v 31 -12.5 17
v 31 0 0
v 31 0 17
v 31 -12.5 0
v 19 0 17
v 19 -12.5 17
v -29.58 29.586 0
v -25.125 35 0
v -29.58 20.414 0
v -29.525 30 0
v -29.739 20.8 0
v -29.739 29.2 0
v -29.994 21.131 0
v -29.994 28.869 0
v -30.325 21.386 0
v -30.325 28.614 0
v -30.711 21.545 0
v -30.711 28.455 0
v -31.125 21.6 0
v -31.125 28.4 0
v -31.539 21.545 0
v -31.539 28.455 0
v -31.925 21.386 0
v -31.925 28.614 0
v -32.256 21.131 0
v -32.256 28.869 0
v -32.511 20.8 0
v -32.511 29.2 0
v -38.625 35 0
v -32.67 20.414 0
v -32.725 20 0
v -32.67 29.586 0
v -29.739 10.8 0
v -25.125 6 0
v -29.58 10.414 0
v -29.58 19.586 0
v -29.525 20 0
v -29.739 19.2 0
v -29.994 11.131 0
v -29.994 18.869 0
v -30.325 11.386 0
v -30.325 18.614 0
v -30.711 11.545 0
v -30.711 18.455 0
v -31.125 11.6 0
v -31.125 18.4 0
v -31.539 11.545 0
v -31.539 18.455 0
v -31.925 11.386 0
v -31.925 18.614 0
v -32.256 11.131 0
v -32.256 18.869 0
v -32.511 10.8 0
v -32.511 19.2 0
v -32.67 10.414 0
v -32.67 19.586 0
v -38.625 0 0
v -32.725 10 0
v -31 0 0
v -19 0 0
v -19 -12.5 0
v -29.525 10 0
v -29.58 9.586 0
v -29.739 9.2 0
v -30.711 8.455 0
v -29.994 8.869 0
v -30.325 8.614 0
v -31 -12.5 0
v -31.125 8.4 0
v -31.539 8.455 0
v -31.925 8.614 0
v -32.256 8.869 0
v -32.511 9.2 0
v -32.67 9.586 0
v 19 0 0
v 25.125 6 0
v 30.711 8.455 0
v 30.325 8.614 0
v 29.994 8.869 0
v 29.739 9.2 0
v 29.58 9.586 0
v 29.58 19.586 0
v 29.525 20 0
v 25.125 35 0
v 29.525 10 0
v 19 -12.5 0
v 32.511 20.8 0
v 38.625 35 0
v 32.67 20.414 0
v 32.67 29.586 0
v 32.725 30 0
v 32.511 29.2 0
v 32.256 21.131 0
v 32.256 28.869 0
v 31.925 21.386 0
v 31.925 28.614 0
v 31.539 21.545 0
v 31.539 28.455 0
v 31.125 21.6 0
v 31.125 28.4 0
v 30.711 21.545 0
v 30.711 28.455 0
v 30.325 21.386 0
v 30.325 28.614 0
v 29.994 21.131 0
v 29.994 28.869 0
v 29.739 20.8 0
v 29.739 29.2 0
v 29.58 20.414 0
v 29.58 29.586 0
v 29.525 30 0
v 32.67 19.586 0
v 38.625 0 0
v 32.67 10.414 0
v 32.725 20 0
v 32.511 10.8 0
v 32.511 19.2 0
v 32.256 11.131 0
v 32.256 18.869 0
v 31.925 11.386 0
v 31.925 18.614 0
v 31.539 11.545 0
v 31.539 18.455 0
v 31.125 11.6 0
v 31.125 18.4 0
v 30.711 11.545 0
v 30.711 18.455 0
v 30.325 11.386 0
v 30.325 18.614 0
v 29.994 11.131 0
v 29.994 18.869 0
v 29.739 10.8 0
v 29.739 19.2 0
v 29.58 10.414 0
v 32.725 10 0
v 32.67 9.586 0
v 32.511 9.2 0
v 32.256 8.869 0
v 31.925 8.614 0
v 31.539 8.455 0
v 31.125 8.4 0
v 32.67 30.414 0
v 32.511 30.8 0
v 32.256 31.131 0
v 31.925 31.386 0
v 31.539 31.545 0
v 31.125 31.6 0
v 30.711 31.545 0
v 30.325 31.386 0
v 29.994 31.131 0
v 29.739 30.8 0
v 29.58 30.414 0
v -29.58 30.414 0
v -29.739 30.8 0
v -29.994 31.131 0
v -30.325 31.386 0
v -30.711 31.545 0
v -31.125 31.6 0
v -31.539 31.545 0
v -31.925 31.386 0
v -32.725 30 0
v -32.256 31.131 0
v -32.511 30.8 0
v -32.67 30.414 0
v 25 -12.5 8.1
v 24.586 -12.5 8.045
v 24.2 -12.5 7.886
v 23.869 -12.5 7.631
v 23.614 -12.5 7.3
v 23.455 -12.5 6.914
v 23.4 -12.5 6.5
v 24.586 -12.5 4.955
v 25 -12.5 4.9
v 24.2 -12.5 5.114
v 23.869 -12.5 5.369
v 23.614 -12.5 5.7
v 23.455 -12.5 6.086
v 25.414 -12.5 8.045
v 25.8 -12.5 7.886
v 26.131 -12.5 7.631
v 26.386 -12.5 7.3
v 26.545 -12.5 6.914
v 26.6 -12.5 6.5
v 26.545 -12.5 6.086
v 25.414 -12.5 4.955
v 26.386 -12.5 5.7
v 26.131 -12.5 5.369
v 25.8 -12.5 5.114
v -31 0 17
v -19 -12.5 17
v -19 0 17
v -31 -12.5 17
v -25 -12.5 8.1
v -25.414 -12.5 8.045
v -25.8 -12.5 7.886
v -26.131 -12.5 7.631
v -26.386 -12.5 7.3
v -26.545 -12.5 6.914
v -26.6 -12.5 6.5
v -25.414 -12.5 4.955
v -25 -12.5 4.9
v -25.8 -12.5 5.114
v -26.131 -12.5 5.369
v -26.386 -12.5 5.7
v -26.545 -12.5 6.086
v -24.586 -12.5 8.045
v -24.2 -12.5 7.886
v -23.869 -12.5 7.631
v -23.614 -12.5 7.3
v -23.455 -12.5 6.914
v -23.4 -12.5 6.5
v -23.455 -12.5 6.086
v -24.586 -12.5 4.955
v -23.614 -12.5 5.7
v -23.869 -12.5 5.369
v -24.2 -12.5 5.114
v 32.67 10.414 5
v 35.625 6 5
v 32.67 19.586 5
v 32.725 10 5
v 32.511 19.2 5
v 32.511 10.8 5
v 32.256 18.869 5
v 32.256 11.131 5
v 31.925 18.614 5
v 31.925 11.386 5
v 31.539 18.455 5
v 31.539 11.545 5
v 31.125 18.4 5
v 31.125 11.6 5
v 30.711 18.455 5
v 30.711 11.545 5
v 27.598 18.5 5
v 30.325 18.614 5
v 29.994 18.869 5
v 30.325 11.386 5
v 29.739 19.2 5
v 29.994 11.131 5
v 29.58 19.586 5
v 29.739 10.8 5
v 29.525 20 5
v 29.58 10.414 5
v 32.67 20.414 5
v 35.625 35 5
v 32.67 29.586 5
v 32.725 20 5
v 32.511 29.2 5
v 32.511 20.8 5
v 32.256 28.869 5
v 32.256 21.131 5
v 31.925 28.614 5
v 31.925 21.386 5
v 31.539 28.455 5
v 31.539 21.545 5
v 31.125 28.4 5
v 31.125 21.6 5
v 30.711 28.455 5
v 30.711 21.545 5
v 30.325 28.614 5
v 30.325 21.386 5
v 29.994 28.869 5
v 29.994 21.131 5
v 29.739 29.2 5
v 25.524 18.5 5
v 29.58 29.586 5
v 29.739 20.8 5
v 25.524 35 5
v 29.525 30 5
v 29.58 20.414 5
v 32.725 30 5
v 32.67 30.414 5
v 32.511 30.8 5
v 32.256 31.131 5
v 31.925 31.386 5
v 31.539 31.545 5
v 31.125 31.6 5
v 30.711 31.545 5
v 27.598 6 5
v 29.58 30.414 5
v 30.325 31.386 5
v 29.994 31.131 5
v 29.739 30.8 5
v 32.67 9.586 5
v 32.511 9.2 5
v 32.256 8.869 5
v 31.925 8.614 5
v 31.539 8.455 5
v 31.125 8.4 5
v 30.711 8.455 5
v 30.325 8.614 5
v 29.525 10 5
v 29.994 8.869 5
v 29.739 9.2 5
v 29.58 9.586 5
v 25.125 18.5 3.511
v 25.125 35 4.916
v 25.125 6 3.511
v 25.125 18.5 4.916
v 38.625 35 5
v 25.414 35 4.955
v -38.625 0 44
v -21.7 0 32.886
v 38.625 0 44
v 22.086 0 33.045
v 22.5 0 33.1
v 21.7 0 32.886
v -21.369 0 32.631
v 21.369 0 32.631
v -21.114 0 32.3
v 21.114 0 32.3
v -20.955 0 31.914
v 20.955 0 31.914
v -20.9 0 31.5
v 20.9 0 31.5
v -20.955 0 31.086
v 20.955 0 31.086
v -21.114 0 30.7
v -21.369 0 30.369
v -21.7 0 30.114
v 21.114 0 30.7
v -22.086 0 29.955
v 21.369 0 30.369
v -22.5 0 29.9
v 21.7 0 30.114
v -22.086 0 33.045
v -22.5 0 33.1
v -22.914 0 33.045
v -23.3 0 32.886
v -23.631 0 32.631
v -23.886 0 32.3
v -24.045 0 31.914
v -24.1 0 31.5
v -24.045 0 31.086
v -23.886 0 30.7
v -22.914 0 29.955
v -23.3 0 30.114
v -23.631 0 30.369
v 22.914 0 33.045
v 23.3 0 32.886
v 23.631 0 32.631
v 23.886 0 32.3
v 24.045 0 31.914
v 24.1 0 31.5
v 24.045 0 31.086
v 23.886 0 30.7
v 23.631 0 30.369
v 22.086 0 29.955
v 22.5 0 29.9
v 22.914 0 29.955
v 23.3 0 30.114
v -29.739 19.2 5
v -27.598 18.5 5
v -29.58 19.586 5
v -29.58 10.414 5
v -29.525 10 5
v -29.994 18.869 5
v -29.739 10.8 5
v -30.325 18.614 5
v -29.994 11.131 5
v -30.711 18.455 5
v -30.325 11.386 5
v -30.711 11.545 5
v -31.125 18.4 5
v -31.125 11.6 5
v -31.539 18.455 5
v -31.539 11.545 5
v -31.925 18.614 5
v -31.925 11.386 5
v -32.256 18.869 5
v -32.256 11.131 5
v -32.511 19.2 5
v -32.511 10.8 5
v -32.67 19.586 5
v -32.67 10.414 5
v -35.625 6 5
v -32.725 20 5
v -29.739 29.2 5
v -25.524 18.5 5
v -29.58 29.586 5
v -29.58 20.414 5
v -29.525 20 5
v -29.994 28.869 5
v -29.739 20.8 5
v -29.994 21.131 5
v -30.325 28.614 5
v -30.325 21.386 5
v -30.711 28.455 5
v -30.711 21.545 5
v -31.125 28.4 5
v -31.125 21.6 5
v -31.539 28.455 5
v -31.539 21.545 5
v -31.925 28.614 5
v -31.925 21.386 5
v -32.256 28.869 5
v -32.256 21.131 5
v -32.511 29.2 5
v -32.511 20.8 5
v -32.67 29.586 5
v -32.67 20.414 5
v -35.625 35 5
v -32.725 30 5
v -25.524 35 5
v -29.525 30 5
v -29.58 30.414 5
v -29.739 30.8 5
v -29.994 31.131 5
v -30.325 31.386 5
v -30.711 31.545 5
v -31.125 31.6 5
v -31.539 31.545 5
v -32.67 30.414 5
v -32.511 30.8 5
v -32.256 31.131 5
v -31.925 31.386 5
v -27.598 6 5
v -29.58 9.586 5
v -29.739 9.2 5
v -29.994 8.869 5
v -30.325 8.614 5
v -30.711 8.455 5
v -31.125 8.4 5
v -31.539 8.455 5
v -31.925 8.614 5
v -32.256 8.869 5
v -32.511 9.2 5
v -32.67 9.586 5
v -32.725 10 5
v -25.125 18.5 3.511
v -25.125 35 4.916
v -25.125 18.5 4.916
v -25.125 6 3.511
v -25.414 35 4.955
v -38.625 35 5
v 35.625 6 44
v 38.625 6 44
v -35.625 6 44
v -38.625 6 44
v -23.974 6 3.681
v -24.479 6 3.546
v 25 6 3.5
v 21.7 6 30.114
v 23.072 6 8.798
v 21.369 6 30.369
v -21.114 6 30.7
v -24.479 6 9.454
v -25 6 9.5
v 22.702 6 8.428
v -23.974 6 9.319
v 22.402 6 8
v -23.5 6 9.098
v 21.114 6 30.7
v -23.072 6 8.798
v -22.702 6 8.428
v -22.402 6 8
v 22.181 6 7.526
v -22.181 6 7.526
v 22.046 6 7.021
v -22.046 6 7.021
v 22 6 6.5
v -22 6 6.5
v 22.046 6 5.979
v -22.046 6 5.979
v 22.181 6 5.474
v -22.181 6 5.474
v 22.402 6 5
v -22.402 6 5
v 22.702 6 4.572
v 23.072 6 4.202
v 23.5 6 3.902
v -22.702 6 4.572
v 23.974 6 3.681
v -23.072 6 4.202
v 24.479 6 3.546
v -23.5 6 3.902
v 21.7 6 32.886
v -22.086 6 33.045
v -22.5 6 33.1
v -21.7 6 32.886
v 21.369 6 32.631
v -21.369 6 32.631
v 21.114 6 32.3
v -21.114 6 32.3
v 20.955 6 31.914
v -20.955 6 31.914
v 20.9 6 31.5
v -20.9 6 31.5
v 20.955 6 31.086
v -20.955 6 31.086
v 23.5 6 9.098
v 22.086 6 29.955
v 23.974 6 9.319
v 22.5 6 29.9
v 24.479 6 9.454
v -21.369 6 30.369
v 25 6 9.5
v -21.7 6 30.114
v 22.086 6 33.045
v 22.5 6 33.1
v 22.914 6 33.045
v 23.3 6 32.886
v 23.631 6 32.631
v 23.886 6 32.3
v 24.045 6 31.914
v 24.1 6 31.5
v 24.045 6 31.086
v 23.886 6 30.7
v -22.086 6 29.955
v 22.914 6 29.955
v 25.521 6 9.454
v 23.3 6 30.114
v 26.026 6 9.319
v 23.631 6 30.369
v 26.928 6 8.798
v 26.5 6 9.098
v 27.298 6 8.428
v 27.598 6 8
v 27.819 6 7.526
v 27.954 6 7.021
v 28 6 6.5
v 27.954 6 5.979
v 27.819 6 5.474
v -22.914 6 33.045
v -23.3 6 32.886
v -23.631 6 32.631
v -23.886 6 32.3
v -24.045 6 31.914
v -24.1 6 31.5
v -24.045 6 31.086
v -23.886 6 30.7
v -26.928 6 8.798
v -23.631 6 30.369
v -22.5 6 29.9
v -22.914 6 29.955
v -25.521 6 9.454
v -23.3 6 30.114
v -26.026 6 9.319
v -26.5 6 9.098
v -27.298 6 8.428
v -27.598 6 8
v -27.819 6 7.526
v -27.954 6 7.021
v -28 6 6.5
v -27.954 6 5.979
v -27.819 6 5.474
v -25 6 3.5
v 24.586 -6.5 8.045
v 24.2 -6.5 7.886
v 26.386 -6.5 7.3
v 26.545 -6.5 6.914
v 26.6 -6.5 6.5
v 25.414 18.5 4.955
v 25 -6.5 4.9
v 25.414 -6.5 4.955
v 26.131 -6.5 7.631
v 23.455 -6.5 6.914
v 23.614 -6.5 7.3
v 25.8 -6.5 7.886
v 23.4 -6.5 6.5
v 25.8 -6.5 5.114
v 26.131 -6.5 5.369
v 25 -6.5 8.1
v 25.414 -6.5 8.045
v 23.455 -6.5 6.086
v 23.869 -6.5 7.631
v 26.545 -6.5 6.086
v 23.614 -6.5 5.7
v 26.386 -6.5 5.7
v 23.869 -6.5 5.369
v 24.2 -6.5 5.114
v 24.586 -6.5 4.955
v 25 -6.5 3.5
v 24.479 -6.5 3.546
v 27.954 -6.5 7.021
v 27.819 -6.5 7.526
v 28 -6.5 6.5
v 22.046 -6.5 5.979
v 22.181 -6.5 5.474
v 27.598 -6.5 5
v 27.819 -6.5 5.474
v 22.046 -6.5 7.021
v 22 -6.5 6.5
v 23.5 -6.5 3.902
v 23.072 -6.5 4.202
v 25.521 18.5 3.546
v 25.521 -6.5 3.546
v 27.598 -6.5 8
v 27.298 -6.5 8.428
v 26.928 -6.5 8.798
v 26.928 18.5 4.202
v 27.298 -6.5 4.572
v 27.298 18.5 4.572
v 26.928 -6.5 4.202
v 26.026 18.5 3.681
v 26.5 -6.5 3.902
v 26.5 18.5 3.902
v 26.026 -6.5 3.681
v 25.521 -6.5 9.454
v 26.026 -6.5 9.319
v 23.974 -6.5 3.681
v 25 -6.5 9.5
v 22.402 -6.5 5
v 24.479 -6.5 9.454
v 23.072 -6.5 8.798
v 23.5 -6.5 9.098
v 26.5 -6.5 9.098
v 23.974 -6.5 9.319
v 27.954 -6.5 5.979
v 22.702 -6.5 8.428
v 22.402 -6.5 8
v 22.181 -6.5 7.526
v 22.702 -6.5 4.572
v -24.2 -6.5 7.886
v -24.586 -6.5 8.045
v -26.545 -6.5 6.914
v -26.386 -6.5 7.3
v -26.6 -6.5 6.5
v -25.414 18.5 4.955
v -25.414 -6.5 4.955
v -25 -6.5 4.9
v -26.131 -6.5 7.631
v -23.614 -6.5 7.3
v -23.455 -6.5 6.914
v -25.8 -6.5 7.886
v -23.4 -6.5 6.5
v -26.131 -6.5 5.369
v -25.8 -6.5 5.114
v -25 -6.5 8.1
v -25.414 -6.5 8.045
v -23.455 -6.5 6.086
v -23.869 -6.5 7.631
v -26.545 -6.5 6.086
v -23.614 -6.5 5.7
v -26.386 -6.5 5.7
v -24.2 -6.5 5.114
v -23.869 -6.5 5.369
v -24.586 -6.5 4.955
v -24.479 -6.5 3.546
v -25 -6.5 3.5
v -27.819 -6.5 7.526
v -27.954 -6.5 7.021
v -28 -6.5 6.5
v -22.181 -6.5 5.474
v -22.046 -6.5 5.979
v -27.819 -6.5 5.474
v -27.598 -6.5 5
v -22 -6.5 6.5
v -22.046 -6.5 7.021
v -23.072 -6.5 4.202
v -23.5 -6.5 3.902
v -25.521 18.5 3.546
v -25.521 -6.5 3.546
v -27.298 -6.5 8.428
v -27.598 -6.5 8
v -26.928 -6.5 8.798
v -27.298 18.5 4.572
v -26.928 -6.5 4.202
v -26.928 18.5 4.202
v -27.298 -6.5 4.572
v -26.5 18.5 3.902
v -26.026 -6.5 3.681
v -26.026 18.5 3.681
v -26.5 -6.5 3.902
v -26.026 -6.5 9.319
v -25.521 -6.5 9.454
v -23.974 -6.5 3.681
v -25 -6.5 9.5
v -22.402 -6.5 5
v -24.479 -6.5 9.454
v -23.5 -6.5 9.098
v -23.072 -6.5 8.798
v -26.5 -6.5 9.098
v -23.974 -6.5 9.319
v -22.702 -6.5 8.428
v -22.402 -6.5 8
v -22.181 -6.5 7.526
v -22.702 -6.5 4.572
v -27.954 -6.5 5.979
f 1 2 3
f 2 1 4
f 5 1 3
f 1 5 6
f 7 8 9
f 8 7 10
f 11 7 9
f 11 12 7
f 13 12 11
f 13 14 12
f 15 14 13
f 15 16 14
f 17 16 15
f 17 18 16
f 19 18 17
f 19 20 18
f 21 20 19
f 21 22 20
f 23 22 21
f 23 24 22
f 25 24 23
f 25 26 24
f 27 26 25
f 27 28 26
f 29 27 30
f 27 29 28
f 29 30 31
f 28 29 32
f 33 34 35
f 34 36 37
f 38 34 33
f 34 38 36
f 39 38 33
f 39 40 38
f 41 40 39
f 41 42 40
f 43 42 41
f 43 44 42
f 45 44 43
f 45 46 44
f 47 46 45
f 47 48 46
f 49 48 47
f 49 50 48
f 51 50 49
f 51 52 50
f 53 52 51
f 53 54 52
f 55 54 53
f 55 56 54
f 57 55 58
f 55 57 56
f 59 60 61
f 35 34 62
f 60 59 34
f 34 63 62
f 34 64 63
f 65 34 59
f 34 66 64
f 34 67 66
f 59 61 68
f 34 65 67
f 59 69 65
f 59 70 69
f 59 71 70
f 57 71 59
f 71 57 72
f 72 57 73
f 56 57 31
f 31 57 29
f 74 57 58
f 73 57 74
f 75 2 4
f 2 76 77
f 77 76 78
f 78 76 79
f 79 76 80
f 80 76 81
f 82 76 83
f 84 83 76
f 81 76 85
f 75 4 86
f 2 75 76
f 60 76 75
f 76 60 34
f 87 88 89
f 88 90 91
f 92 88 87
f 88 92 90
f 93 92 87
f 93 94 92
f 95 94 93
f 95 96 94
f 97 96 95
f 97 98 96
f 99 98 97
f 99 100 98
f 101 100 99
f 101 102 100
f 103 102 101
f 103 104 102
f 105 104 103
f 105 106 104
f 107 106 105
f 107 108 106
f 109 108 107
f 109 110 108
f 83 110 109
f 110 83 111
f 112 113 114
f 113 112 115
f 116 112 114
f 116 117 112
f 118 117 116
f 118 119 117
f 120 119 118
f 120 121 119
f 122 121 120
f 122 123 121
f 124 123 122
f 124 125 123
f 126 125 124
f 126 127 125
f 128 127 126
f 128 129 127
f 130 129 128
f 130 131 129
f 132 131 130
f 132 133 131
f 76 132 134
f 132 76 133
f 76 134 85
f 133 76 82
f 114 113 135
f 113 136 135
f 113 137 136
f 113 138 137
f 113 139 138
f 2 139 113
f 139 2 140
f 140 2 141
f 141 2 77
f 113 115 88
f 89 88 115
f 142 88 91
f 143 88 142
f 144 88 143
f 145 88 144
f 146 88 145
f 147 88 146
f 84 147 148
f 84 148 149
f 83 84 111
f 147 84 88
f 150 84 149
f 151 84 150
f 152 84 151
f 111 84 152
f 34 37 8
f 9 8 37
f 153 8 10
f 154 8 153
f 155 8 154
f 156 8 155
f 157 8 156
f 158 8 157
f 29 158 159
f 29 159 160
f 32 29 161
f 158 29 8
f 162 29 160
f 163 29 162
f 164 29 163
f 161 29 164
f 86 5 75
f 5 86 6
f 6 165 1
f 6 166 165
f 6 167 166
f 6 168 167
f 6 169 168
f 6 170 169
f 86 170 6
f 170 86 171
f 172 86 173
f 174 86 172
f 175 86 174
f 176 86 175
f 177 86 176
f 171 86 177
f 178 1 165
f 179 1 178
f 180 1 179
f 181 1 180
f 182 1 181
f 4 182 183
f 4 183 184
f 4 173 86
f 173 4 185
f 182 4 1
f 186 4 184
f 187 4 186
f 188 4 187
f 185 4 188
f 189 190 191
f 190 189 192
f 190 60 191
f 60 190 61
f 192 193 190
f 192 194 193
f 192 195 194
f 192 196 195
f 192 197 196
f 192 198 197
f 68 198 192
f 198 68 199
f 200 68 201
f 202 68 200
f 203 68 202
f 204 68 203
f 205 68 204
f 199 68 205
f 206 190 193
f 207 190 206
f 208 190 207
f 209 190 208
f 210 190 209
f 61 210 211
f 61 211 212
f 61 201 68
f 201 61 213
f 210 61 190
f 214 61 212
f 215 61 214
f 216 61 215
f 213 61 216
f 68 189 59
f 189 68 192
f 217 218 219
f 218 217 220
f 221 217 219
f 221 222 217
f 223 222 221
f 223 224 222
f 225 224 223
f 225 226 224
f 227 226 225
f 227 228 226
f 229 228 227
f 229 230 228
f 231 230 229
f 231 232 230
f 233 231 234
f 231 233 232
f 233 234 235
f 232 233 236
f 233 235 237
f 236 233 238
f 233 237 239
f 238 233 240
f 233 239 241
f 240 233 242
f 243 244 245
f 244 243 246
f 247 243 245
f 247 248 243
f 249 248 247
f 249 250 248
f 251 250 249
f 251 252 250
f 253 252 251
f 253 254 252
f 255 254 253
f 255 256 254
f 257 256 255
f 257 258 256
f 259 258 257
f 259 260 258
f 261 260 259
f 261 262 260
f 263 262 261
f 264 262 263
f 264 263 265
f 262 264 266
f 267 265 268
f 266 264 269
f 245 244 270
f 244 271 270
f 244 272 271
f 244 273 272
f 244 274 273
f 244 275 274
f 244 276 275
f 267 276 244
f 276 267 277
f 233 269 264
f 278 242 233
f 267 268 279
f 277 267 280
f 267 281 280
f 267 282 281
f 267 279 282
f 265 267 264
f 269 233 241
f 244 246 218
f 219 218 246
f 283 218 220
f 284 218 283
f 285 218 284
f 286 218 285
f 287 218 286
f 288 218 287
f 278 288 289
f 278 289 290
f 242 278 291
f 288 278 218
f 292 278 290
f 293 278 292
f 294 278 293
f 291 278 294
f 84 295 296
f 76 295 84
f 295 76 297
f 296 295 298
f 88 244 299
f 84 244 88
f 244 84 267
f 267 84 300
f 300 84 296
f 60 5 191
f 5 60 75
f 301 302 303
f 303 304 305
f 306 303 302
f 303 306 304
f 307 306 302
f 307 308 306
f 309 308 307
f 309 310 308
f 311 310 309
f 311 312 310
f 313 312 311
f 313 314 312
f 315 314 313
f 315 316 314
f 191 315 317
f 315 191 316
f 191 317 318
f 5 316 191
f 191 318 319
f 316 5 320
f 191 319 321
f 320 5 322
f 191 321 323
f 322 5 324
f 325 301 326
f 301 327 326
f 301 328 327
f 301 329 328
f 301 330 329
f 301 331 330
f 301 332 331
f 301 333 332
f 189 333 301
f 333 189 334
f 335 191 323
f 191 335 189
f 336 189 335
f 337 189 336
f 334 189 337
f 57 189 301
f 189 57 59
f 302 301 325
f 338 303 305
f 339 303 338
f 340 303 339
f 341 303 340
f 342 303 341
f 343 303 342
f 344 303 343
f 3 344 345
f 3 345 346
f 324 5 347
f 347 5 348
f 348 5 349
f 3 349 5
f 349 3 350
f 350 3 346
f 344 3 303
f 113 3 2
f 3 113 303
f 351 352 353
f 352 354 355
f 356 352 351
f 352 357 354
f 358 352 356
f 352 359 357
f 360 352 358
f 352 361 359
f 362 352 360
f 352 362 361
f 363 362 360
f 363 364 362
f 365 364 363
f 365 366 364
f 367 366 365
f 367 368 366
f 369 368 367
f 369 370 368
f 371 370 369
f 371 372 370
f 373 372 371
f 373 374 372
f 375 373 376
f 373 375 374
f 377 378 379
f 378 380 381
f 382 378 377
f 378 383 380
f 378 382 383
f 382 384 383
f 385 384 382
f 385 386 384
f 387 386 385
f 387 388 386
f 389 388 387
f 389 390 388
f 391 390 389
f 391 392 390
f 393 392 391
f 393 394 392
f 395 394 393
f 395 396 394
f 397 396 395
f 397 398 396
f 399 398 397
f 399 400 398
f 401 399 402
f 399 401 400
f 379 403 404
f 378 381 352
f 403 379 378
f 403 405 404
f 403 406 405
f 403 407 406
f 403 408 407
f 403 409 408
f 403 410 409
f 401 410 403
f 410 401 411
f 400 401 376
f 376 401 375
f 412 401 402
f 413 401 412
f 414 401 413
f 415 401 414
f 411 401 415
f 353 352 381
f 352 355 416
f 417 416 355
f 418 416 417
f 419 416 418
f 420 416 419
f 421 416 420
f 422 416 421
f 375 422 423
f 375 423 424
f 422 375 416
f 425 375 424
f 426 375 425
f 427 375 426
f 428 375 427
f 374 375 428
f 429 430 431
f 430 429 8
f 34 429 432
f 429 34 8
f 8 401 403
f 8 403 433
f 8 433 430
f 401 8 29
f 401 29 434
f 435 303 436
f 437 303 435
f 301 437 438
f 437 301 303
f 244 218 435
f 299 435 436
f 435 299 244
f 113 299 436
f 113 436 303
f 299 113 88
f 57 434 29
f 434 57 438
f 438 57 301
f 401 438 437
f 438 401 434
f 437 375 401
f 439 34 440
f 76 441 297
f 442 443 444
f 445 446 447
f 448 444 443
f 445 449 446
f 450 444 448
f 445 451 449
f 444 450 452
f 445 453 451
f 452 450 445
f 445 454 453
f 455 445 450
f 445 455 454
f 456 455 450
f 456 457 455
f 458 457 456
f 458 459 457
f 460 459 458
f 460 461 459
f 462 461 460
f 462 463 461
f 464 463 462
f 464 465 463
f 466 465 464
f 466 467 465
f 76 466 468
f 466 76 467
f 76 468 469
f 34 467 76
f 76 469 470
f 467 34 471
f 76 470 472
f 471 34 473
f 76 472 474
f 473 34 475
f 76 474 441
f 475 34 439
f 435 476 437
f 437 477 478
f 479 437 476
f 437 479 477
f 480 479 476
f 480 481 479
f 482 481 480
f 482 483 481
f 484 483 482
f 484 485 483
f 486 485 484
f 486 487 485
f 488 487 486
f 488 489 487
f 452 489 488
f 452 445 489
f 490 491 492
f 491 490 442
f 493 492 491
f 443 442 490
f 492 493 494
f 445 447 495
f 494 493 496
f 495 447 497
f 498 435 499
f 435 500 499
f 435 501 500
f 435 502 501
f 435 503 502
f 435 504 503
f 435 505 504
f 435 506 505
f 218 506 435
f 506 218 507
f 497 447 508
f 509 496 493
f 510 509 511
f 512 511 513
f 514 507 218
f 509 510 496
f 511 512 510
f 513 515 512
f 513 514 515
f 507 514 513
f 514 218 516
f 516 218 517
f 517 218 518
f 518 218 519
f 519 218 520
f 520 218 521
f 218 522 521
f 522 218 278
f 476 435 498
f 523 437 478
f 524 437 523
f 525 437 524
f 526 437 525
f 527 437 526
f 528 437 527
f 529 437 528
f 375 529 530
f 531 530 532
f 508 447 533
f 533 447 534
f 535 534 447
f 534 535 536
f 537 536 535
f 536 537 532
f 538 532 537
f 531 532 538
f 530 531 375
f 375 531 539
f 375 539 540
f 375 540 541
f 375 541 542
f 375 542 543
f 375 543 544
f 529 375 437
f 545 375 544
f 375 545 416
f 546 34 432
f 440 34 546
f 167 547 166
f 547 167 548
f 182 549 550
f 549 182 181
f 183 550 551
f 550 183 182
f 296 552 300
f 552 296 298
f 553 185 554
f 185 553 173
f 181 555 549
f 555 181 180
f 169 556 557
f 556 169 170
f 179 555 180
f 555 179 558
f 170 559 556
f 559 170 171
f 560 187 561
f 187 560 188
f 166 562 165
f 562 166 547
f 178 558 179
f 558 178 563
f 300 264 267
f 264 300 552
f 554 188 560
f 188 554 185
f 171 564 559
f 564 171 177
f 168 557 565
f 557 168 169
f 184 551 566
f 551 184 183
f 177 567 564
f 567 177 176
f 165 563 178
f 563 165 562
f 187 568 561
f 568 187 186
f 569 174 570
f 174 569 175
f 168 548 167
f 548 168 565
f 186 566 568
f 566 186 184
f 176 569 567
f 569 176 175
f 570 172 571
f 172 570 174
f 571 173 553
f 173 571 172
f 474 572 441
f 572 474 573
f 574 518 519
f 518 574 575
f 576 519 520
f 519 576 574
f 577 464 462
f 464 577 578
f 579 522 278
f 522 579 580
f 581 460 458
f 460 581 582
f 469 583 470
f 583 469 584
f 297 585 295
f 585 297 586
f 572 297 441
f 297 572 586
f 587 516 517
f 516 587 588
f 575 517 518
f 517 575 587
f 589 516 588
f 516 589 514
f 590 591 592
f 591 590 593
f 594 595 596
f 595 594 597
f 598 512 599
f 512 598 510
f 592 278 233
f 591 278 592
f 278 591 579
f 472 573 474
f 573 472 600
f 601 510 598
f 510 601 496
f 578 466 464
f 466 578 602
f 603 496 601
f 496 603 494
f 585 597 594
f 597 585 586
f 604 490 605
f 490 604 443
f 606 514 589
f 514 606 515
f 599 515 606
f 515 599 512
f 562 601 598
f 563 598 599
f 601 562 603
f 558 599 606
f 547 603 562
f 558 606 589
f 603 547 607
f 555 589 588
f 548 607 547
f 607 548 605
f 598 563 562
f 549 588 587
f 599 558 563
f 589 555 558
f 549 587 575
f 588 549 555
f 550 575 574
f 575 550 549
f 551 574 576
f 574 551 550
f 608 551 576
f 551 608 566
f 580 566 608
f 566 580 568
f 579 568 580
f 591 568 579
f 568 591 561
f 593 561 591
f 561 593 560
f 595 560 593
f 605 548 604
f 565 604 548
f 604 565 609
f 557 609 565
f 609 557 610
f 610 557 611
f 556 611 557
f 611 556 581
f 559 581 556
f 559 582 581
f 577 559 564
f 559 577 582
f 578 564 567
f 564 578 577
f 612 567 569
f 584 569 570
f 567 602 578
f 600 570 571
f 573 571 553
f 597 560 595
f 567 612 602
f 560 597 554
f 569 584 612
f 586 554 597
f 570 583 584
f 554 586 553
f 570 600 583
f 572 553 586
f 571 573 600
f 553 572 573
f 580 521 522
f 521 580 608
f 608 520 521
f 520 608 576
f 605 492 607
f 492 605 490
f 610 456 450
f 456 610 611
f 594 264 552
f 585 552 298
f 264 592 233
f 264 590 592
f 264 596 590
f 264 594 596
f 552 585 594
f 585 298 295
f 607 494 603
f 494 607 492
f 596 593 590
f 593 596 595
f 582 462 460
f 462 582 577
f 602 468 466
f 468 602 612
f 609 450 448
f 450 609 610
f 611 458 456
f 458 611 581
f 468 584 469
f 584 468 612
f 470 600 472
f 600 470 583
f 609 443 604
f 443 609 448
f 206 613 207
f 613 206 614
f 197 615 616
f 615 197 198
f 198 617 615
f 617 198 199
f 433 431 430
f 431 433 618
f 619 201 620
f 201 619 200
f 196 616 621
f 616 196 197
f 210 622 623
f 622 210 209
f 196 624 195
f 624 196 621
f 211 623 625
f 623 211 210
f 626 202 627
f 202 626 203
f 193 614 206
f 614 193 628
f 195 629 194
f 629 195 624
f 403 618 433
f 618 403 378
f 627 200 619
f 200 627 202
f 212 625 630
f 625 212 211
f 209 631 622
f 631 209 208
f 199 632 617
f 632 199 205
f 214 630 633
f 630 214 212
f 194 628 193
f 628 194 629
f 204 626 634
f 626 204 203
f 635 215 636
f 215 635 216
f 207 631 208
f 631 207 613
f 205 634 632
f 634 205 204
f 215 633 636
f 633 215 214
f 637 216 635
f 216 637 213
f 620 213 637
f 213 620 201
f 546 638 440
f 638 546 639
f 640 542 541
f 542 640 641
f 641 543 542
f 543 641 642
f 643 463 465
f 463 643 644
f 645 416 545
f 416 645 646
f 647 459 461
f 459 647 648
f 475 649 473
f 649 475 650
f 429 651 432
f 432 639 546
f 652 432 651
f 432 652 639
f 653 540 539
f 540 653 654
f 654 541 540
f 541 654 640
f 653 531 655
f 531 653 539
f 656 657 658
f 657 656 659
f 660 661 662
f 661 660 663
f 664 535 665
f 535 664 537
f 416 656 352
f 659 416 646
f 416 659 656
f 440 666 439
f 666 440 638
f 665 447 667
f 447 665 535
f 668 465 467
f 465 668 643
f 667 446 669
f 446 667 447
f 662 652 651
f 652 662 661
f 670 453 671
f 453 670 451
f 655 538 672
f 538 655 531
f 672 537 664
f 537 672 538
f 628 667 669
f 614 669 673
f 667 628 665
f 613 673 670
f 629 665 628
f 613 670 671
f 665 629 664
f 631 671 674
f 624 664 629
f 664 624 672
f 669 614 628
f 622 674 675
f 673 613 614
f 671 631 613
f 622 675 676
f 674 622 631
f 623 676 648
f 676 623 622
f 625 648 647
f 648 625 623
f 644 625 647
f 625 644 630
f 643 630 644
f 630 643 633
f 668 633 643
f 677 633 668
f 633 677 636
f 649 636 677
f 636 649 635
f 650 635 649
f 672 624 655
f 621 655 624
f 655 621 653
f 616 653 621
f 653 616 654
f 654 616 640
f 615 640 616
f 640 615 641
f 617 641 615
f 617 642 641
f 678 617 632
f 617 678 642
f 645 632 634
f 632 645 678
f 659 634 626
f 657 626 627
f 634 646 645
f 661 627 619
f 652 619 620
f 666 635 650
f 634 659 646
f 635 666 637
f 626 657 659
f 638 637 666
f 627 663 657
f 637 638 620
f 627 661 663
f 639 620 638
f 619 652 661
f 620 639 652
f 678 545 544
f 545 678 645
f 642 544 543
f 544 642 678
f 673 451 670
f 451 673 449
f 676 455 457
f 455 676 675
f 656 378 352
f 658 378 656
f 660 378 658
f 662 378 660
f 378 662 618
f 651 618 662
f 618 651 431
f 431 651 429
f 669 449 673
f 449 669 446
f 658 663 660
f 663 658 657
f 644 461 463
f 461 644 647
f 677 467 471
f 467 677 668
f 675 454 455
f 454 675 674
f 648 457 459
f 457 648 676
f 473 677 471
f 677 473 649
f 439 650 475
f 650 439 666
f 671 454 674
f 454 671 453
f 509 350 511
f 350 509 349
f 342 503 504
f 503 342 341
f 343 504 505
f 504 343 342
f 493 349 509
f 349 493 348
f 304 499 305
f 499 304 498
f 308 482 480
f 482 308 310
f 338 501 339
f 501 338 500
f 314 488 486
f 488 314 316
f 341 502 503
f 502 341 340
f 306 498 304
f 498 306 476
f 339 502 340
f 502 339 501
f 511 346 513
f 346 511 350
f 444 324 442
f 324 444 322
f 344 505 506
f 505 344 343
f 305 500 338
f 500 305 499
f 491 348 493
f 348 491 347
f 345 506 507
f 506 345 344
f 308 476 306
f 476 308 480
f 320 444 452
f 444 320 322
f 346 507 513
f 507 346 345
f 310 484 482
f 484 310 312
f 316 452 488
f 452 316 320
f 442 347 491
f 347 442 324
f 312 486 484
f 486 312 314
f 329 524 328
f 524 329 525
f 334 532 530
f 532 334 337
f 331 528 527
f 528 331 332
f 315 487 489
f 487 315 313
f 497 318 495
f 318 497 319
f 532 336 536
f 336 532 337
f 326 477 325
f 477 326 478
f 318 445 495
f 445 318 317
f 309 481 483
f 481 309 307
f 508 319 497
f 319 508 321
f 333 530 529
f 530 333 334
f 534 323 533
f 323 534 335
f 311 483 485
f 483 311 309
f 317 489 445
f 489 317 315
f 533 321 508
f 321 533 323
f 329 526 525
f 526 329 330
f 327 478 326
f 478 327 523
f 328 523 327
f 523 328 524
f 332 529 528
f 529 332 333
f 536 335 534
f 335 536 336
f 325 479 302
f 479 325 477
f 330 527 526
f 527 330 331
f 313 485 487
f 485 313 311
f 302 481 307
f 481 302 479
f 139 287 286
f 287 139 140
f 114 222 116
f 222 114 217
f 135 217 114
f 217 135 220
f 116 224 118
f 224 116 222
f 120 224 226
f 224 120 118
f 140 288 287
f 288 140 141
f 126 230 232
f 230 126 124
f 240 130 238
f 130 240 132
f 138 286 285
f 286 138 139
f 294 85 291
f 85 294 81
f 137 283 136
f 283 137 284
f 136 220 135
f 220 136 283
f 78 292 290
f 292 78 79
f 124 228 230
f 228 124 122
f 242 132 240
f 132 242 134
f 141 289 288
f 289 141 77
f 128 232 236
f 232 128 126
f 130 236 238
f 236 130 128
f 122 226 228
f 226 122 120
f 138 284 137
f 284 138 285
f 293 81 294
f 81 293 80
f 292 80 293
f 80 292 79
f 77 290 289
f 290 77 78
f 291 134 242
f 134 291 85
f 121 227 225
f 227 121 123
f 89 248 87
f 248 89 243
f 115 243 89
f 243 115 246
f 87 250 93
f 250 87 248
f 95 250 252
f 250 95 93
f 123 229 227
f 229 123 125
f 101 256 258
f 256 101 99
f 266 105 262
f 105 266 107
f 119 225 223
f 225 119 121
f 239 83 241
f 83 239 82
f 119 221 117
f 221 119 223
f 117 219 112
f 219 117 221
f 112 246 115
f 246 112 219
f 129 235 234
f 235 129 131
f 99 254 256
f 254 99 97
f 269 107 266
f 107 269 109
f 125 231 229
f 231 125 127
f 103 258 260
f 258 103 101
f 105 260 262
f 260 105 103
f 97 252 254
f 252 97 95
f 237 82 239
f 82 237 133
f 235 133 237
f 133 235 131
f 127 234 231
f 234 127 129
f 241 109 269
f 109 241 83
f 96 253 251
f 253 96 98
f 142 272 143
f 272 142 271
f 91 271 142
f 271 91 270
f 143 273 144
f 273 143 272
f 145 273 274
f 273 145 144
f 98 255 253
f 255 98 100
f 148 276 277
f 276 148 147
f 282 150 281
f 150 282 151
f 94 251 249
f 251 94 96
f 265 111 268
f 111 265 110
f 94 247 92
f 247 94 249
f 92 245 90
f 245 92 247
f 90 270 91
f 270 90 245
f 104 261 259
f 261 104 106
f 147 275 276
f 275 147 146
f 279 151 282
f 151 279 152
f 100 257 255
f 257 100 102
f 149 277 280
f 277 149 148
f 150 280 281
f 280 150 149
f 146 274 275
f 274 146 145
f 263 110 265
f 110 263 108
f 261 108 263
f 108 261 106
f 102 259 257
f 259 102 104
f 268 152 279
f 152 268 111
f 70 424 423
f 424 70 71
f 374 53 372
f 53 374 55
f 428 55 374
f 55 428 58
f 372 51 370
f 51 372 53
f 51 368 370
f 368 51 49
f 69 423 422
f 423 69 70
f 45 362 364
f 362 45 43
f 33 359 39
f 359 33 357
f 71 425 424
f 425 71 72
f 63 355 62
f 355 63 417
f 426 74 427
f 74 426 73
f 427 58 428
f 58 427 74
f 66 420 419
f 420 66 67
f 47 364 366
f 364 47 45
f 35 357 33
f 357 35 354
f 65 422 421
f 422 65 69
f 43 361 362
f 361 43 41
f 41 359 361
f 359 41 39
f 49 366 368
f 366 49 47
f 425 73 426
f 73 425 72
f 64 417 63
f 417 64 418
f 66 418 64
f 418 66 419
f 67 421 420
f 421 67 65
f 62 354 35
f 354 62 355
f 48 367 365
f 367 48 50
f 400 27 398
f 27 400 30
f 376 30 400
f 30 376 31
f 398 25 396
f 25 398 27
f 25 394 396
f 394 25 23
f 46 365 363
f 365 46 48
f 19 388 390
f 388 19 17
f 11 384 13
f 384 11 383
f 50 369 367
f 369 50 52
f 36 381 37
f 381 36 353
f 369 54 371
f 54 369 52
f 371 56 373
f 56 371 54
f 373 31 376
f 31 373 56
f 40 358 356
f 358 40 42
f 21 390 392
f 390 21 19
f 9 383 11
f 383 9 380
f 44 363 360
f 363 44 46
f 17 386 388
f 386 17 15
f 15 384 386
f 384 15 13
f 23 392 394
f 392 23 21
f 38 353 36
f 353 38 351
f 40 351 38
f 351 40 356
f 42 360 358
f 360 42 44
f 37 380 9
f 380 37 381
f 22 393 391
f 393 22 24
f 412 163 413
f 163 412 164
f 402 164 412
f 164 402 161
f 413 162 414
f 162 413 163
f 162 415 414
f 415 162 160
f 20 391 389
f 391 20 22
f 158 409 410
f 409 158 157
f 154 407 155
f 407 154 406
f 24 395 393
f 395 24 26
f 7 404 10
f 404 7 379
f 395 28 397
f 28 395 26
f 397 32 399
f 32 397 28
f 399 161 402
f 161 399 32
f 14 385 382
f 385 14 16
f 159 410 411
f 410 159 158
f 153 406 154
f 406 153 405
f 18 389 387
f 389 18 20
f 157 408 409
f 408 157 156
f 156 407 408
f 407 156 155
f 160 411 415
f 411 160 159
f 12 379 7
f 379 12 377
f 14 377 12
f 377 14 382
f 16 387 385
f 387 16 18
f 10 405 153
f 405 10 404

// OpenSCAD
FFF=[false,false,false];FFT=[false,false,true];
FTF=[false,true,false];FTT=[false,true,true];
TFF=[true,false,false];TFT=[true,false,true];
TTF=[true,true,false];TTT=[true,true,true];
module cube2(size, center) {
  translate([
    center[0] ? -size[0]/2 : 0,
    center[1] ? -size[1]/2 : 0,
    center[2] ? -size[2]/2 : 0]) cube(size);
}
module mirror_x() {
  for(a=[0,1])mirror([a,0,0])children();
}
module mirror_y() {
  for(a=[0,1])mirror([0,a,0])children();
}
module mirror_z() {
  for(a=[0,1])mirror([0,0,a])children();
}


module switch_bracket() {
    points1=[[70,35],[70,35+48],[-70,35],[-70,35+48]];
    holes1=[[70,35],[70,35+37],[-70,35],[-70,35+48]];
    holes2=[[50,0],[0,0],[-50,0]];
    points=concat(points1,holes2);
    module joint(array, i1, i2) {
        hull() {
            translate(array[i1]) cylinder(d=12,h=4);
            translate(array[i2]) cylinder(d=12,h=4);
        }
    }
    difference() {
        union() {
            joint(points, 0, 1);
            joint(points, 1, 3);
            joint(points, 3, 2);
            joint(points, 2, 6);
            joint(points, 6, 5);
            joint(points, 5, 4);
            joint(points, 4, 0);
        }
        
        for(xy=holes2)translate(xy)cylinder(d=3.2,h=20,center=true,$fn=24);
        for(xy=holes1)translate(xy) {
            cylinder(d=3.2,h=20,center=true,$fn=24);
            translate([0,0,-0.01])cylinder(d1=6.2,d2=3.2,h=3,$fn=24);
        }
    }
}

module realsense_bracket() {
    distance_x=62.25/2;
    difference() {
        union() {
            cube2([72,6,50-6],TFF);
            mirror_x()translate([25,-12.5])cube2([12,13,25-6-2],TFF);
            
            mirror_x()translate([distance_x,0])cube2([12,35,5],TFF);
            mirror_x()translate([distance_x+6,0])hull() {
                cube2([3,35,5],TFF);
                cube2([3,6,50-6],TFF);
            }
        }
        mirror_x()translate([50/2,0,12.5-6]) {
            rotate([90,0])cylinder(d=3.2,h=100,center=true,$fn=24);
            translate([0,25-12.5+6])rotate([90,0])cylinder(d=6,h=25,$fn=36);
        }
        mirror_x()translate([45/2,0,25+12.5-6]) {
            rotate([90,0])cylinder(d=3.2,h=100,center=true,$fn=24);
        }
        mirror_x() for(a=[10,20,30])translate([distance_x,a])cylinder(d=3.2,h=30,$fn=24,center=true);
    }
}

//switch_bracket();
realsense_bracket();
